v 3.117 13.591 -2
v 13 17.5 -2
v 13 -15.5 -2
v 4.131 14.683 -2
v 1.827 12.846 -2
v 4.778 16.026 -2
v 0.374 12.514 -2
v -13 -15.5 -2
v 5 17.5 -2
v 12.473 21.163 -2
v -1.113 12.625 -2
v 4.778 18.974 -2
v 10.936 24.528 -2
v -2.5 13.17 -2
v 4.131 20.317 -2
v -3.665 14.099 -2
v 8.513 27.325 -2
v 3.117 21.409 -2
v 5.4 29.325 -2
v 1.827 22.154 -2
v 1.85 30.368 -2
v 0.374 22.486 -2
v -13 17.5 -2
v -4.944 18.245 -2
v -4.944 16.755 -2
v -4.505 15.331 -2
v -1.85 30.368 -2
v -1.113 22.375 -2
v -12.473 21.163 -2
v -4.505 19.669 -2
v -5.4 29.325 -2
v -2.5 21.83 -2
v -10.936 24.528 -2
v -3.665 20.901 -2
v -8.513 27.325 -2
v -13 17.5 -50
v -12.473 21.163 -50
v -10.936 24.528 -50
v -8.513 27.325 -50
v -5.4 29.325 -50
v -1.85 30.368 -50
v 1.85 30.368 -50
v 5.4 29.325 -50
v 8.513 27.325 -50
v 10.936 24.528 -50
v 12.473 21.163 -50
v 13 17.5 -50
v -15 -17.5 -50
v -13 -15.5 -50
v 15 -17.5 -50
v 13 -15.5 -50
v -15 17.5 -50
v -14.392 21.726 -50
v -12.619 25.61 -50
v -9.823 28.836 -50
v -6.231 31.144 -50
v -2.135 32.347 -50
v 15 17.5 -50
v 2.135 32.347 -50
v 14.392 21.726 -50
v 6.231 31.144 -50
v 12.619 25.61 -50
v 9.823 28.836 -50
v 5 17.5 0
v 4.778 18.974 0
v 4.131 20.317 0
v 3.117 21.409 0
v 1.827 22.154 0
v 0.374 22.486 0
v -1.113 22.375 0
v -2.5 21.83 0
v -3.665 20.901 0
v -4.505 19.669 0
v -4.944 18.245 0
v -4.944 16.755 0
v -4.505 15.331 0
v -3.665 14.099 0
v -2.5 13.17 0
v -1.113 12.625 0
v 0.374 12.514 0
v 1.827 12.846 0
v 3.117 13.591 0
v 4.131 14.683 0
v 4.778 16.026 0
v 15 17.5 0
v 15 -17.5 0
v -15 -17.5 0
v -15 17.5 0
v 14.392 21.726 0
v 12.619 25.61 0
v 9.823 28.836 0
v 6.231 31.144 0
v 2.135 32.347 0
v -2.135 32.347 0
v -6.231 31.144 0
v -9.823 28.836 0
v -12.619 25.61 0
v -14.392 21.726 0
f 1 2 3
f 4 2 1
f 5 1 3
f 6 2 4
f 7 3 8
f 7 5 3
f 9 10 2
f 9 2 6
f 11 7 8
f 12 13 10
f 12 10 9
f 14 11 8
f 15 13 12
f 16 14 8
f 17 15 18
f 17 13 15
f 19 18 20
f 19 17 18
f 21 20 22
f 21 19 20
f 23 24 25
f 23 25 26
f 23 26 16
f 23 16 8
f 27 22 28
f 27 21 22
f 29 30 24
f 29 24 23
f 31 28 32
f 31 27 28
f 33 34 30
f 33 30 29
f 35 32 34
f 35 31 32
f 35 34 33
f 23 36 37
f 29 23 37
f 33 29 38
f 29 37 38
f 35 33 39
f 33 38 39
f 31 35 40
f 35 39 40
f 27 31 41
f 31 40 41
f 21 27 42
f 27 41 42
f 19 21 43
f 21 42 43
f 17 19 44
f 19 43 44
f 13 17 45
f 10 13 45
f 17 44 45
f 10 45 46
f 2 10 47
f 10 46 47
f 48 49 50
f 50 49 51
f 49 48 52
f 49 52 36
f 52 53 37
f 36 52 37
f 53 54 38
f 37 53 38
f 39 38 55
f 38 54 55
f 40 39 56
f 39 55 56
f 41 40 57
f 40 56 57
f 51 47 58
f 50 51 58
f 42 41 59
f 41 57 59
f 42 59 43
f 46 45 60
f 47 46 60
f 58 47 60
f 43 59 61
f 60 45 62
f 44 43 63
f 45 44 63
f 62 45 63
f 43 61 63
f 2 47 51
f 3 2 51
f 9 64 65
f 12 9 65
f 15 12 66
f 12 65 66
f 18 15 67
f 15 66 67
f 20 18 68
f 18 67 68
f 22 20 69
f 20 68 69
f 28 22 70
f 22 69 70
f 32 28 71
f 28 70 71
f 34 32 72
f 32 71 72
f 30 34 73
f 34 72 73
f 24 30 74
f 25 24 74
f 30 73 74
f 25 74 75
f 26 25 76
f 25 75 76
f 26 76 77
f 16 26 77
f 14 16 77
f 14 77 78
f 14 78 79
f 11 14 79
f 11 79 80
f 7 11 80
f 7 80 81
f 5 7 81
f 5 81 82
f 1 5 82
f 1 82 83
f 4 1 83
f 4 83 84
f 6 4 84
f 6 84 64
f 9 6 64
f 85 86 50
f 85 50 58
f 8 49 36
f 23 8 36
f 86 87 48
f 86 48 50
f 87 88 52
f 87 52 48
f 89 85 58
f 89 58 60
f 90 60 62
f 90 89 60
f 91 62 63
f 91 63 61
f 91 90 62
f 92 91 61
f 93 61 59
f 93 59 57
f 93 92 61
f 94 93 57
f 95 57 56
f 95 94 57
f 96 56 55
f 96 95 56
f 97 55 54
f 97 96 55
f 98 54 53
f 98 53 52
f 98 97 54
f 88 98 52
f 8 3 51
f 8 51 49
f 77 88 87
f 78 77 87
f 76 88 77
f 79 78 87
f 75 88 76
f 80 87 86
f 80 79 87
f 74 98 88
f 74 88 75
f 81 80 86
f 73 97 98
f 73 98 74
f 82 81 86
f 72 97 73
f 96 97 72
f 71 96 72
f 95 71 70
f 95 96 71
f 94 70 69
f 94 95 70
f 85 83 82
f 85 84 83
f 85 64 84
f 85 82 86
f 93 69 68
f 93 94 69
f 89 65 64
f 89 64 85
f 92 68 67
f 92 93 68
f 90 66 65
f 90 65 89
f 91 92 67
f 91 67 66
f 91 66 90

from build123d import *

# Parameters (mm, degrees)
ESQUISSE1_R             = 5
BOSS_EXTRU_1_DEPTH      = 50
ENL_V_MAT_EXTRU_2_DEPTH = 48


with BuildPart() as part:
    # Esquisse1 → Boss.-Extru.1 (new body)
    with BuildSketch(Plane.XY):
        with BuildLine():
            Line((-15, -17.5), (15, -17.5))
            Line((15, -17.5), (15, 17.5))
            ThreePointArc((15, 17.5), (0, 32.5), (-15, 17.5))
            Line((-15, 17.5), (-15, -17.5))
        make_face()
        with Locations((0, 17.5)):
            Circle(ESQUISSE1_R, mode=Mode.SUBTRACT)
    extrude(amount=-BOSS_EXTRU_1_DEPTH)

    # Esquisse2 → Enlèv. mat.-Extru.2 (cut)
    with BuildSketch(Plane(origin=(0, 0, -50), x_dir=(-1, 0, 0), z_dir=(0, 0, -1))):
        with BuildLine():
            Line((-13, 17.5), (-13, -15.5))
            Line((-13, -15.5), (13, -15.5))
            Line((13, -15.5), (13, 17.5))
            ThreePointArc((13, 17.5), (0, 30.5), (-13, 17.5))
        make_face()
    extrude(amount=-ENL_V_MAT_EXTRU_2_DEPTH, mode=Mode.SUBTRACT)


solid = part.part
